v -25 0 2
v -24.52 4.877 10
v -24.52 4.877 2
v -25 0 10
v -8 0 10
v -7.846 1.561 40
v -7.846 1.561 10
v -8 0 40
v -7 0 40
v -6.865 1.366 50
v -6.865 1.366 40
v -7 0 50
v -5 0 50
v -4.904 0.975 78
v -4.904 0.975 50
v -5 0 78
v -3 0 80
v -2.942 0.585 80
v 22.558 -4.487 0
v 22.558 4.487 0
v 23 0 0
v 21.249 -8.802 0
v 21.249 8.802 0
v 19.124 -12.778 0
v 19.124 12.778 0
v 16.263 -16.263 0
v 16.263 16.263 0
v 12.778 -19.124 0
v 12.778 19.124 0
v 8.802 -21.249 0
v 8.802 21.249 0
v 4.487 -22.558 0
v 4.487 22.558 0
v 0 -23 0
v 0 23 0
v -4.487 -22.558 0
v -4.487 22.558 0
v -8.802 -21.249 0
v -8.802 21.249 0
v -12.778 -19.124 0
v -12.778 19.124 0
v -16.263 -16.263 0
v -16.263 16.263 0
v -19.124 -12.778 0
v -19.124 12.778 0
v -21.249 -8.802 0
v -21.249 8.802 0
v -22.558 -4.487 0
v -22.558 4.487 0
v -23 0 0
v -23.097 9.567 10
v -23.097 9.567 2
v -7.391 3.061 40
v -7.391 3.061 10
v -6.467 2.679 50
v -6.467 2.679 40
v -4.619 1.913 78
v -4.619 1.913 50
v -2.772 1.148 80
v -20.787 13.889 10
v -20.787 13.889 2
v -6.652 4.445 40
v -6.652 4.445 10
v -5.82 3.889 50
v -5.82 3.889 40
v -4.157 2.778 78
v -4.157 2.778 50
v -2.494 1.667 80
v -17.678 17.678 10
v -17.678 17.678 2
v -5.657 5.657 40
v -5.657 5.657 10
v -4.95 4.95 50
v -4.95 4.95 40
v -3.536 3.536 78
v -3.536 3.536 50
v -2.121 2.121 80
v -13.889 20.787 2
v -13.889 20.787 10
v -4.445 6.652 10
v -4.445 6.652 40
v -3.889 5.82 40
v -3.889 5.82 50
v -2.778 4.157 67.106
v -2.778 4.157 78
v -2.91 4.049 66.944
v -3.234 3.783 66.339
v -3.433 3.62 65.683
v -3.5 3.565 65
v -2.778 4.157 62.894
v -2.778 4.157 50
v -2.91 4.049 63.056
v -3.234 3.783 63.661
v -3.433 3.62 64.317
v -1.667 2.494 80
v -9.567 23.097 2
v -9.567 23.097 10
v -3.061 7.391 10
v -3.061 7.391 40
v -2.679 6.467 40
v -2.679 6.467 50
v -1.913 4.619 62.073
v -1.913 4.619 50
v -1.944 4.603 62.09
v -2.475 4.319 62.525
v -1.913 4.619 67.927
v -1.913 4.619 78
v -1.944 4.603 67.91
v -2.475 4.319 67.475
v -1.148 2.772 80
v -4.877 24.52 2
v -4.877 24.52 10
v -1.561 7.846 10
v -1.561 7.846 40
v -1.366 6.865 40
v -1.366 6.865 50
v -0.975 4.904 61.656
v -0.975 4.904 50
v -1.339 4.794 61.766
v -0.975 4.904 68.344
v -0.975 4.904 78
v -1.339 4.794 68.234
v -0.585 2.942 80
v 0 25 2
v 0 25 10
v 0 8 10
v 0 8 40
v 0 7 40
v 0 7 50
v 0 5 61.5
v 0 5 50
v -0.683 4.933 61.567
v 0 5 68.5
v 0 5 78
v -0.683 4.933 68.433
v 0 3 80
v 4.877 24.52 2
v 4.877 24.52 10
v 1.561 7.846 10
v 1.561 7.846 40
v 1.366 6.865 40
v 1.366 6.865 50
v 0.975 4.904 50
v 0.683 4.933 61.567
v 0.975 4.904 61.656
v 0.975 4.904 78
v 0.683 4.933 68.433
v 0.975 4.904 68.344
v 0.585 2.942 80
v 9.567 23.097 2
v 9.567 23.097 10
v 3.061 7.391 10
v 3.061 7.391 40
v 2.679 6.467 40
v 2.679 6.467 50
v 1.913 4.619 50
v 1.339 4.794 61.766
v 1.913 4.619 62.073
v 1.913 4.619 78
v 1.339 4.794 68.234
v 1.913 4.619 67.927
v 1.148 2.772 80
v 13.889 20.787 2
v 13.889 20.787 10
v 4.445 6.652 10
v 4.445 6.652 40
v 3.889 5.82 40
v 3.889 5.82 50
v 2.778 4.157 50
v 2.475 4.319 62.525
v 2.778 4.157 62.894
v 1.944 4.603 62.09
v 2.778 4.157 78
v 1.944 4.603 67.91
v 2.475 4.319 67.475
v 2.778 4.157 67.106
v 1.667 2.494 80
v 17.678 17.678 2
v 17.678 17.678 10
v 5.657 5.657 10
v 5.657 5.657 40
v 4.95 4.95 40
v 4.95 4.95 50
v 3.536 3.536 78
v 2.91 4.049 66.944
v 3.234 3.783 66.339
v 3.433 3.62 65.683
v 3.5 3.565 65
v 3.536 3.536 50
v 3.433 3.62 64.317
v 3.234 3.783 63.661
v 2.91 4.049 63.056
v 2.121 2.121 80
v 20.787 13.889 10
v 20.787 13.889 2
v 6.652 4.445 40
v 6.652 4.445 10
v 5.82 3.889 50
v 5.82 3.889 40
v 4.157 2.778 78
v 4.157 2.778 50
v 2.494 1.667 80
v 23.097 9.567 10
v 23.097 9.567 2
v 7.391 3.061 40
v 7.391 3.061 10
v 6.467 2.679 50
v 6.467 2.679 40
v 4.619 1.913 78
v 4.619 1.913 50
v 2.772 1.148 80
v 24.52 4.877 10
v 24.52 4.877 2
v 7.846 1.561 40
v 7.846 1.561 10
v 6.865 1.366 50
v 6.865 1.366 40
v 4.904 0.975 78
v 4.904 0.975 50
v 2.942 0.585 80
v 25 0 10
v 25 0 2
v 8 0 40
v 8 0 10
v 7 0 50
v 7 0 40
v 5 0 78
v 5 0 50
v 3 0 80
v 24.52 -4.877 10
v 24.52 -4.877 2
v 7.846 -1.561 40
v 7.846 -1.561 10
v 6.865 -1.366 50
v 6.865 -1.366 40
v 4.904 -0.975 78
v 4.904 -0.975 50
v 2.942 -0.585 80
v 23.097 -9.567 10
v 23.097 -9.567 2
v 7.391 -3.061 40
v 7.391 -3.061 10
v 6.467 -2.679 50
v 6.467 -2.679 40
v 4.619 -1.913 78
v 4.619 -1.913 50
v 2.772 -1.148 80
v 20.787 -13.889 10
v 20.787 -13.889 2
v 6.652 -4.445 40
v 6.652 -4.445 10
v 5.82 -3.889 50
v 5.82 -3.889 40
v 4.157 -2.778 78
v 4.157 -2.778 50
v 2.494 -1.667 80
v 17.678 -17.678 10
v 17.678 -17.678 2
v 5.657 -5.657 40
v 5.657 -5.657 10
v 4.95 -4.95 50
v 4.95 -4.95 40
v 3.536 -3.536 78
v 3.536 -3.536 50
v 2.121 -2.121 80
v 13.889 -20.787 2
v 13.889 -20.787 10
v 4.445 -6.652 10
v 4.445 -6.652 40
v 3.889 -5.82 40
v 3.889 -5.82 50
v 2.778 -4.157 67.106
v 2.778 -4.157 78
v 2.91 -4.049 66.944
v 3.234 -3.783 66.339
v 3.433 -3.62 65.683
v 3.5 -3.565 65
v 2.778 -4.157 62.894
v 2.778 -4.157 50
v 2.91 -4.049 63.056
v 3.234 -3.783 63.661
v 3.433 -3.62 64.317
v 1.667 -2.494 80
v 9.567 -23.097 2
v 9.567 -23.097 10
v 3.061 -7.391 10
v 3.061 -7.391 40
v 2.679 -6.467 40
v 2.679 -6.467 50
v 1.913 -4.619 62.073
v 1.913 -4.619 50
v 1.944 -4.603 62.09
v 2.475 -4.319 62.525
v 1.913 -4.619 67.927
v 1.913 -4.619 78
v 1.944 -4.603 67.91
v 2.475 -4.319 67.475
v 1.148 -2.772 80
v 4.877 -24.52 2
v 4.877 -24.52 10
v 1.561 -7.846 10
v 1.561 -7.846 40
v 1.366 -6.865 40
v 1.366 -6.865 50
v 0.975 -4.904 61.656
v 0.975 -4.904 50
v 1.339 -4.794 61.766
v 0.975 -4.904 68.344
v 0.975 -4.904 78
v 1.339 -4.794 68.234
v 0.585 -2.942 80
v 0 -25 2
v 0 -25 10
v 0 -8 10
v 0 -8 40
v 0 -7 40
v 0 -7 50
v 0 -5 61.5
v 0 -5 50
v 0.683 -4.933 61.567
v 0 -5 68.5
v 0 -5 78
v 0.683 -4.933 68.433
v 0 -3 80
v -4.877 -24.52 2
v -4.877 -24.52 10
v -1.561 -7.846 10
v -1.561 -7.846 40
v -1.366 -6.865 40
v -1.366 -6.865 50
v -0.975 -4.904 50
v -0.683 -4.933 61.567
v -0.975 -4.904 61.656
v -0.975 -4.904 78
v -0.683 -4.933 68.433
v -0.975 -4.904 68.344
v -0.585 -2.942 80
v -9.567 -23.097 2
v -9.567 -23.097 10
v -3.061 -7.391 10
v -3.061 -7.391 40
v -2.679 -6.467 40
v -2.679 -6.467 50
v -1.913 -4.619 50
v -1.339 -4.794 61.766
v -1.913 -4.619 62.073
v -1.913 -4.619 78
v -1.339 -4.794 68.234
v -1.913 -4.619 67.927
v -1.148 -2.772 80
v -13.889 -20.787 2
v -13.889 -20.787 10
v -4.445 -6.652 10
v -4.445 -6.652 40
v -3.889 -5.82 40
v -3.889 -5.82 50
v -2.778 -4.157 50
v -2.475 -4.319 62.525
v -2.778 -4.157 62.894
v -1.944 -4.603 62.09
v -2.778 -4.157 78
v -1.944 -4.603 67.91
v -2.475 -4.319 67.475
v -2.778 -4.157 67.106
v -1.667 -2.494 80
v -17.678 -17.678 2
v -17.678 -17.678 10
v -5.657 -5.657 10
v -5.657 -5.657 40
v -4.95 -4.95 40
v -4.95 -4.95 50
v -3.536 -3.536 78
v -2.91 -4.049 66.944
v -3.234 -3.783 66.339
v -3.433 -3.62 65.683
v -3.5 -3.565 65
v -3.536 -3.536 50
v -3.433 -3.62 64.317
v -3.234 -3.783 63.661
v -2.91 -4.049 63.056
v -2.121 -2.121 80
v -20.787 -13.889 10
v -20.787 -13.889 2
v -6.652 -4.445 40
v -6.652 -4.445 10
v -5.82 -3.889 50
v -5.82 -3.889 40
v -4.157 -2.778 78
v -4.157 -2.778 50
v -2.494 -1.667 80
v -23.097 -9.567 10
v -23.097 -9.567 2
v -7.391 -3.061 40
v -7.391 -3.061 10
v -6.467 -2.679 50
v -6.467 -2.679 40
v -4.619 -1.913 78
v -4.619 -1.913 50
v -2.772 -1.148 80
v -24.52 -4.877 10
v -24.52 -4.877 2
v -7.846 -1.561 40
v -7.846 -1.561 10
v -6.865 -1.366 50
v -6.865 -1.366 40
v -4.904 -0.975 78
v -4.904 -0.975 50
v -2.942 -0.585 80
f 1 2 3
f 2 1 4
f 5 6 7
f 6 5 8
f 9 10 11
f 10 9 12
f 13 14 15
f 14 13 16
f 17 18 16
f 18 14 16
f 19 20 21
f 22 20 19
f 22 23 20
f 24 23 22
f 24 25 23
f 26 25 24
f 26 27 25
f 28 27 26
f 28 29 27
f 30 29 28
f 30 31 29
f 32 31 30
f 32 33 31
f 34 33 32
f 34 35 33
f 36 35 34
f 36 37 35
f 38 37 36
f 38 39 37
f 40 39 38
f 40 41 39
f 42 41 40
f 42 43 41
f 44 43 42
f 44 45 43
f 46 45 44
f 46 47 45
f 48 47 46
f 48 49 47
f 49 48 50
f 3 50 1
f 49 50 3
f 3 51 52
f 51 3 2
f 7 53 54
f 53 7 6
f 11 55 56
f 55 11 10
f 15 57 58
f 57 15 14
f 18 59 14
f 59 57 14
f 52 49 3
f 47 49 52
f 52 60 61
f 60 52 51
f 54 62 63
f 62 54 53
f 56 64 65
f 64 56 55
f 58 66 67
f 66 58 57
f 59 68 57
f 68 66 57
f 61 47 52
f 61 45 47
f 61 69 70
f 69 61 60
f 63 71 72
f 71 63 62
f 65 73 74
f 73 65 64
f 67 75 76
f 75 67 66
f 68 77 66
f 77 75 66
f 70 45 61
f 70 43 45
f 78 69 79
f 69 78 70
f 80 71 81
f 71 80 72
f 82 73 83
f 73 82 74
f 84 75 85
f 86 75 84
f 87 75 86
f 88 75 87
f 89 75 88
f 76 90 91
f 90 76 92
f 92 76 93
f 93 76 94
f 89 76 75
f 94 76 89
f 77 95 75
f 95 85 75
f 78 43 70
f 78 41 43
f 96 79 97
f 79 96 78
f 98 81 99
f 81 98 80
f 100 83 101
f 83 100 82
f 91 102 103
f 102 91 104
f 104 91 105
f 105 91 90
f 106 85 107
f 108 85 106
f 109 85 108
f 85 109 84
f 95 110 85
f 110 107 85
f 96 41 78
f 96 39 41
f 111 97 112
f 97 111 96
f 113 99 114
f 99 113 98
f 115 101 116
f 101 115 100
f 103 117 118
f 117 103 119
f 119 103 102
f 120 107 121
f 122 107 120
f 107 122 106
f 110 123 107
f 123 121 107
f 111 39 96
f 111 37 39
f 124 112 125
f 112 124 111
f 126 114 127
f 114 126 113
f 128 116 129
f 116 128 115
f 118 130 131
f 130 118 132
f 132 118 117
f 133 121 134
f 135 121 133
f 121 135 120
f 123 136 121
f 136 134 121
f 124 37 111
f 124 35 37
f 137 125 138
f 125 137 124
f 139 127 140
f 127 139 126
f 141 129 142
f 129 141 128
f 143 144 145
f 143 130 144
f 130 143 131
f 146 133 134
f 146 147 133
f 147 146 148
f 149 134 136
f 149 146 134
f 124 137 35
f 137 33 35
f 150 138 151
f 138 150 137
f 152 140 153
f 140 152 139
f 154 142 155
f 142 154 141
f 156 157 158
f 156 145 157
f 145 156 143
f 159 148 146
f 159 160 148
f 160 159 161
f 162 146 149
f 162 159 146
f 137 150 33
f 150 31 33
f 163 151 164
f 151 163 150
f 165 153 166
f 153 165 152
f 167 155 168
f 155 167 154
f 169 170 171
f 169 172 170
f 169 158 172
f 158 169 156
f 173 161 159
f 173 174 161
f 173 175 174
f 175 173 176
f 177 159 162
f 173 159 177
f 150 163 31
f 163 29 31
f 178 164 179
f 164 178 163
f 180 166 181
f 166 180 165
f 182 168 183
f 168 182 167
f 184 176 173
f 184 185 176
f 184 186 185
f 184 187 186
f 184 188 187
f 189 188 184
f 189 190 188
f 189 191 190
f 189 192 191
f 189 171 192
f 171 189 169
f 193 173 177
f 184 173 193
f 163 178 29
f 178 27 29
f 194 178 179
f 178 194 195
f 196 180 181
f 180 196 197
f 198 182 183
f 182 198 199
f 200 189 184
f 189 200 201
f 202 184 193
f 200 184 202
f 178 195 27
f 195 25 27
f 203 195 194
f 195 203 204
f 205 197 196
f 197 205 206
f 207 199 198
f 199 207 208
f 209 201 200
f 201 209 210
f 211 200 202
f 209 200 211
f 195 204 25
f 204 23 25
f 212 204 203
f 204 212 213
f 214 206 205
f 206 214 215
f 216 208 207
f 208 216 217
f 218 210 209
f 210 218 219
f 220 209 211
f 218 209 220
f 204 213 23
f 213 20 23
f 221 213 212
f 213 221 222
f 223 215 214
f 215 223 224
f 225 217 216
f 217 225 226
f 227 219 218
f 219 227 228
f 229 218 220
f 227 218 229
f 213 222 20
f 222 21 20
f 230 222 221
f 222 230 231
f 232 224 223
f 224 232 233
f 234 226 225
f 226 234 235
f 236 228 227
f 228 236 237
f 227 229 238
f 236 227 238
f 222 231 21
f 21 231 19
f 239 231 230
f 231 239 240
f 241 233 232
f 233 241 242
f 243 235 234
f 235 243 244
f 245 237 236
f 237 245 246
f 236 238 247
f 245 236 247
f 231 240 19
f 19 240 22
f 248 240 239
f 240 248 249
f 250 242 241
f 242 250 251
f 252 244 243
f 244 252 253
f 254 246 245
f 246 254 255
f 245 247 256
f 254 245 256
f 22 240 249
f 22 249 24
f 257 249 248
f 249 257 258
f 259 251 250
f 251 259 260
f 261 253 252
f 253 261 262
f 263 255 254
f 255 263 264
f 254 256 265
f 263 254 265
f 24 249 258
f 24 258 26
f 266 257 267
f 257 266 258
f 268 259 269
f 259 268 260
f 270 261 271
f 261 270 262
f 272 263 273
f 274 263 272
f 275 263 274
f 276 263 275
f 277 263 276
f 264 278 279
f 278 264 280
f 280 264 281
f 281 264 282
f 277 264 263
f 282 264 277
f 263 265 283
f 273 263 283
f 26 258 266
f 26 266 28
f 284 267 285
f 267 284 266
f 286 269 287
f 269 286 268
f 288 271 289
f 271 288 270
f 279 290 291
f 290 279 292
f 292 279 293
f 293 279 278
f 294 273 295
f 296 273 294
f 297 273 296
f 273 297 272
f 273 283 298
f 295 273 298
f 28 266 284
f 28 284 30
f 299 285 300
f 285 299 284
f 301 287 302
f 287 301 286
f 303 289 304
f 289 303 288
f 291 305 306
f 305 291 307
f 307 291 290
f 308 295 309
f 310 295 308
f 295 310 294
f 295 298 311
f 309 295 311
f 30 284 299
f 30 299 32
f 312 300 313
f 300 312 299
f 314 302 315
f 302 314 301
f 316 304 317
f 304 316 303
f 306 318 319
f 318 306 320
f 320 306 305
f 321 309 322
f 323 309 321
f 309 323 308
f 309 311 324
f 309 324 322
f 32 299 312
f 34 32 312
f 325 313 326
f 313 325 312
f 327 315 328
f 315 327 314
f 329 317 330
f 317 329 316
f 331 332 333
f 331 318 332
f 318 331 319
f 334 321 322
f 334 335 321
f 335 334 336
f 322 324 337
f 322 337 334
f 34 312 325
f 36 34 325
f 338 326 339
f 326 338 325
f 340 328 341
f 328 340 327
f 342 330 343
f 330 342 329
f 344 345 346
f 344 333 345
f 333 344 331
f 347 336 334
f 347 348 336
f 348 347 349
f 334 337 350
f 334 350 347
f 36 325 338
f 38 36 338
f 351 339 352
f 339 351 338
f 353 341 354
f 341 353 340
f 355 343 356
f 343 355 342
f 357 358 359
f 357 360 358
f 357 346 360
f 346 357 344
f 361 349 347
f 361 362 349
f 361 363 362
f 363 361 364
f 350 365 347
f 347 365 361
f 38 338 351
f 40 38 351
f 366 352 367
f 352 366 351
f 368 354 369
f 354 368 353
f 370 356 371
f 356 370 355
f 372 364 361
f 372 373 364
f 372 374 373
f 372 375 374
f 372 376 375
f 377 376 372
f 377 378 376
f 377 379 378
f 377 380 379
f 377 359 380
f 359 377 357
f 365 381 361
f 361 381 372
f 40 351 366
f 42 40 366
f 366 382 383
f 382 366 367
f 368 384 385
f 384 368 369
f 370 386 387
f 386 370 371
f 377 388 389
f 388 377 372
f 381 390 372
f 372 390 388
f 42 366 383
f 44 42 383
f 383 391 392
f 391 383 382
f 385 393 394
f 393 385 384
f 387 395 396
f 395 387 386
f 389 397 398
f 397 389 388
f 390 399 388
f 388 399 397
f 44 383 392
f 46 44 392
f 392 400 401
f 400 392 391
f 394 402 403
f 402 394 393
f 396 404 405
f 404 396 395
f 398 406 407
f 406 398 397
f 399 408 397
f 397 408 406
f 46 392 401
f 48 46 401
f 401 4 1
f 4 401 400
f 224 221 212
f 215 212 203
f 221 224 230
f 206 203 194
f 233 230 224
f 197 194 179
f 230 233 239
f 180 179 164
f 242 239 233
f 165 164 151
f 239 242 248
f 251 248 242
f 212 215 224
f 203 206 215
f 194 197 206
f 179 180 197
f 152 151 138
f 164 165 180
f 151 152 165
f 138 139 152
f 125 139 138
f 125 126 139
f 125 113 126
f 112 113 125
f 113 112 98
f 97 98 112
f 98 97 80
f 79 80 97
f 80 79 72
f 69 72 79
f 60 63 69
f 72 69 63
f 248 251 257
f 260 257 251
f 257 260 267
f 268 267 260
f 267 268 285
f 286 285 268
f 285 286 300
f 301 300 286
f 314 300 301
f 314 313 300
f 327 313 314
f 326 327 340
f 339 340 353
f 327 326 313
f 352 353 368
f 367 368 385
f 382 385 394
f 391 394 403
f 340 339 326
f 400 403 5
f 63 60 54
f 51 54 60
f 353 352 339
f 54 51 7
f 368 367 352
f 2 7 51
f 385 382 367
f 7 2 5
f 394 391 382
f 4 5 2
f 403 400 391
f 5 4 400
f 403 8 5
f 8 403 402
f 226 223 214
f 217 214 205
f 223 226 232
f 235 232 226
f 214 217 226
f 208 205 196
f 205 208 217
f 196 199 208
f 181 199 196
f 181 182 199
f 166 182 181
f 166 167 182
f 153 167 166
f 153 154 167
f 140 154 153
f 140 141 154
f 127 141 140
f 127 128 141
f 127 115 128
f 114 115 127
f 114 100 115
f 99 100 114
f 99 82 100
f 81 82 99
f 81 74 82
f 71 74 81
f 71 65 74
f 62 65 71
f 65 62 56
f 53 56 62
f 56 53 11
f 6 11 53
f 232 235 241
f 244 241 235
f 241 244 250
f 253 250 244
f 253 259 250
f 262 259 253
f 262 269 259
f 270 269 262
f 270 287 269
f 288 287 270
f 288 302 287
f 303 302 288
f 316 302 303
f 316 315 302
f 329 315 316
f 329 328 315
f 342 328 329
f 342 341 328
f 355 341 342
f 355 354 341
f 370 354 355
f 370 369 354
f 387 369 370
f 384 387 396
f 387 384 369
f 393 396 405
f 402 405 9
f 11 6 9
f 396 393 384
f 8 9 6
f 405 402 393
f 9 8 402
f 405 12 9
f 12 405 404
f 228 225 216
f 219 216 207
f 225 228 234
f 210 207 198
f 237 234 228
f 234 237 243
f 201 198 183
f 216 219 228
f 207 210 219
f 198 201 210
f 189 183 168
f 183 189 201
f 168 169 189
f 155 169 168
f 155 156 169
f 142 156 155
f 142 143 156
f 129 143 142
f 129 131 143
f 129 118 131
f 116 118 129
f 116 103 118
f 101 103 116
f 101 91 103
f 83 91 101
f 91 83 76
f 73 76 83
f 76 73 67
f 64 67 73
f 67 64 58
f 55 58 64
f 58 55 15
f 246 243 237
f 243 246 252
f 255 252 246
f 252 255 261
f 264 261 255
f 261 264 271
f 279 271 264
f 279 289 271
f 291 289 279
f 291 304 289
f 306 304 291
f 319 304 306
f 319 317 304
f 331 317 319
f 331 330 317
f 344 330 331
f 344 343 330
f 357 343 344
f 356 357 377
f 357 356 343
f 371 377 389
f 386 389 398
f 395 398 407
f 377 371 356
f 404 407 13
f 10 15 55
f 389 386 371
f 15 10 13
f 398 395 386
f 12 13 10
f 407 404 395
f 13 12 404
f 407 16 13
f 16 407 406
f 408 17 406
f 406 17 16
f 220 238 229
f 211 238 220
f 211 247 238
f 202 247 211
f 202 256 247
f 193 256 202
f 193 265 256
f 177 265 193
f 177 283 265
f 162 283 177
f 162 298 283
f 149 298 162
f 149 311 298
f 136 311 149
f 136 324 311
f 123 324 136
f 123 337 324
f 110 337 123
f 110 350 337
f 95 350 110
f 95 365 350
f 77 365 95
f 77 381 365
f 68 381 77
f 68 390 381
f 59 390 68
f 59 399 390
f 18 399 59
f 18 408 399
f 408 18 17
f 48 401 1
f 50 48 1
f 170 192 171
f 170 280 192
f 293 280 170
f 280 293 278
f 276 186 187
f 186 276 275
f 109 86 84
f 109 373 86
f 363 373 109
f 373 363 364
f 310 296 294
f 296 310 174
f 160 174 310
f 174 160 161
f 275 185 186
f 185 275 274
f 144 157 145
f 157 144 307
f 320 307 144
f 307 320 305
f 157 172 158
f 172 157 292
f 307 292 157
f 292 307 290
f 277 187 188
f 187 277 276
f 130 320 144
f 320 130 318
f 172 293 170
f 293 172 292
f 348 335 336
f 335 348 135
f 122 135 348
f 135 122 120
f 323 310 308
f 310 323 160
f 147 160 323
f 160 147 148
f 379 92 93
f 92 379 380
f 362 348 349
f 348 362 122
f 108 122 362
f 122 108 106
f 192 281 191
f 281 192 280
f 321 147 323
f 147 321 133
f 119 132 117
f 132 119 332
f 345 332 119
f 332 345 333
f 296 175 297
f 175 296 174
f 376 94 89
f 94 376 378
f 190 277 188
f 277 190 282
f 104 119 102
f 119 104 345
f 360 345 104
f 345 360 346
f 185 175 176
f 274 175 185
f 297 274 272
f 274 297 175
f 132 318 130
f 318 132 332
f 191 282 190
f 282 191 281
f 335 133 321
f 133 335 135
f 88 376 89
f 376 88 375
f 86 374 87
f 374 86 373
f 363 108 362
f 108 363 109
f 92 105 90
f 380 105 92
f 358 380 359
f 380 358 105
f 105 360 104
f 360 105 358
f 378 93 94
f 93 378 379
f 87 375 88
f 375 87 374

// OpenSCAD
$fn = 32;

// ----------------------------------------------------------------------
// Stepped shaft: diameters 50, 16, 14, 10 mm, 80 mm long
// ----------------------------------------------------------------------

// --- parameters (mm) ---
d1 = 50;                  // step 1 diameter
len1 = 10;                // step 1 length
d2 = 16;                  // step 2 diameter
len2 = 30;                // step 2 length
d3 = 14;                  // step 3 diameter
len3 = 10;                // step 3 length
d4 = 10;                  // step 4 diameter
len4 = 30;                // step 4 length
total = 80;               // overall length
chamfer = 2;              // end chamfer
cross_d = 7;              // cross pin hole
cross_z = 65;             // cross hole position

/* closed turning profile: x is the radius, y is the length */
profile = [[0, 0], [25 - chamfer, 0], [25, chamfer], [25, 10], [8, 10], [8, 40], [7, 40], [7, 50], [5, 50], [5, 78], [3, 80], [0, 80]];

difference() {
  rotate_extrude() polygon(profile);
  /* cross pin hole through the small step */
  translate([0, 0, cross_z]) rotate([90, 0, 0]) cylinder(h = d4 + 4, d = cross_d, center = true);
}
